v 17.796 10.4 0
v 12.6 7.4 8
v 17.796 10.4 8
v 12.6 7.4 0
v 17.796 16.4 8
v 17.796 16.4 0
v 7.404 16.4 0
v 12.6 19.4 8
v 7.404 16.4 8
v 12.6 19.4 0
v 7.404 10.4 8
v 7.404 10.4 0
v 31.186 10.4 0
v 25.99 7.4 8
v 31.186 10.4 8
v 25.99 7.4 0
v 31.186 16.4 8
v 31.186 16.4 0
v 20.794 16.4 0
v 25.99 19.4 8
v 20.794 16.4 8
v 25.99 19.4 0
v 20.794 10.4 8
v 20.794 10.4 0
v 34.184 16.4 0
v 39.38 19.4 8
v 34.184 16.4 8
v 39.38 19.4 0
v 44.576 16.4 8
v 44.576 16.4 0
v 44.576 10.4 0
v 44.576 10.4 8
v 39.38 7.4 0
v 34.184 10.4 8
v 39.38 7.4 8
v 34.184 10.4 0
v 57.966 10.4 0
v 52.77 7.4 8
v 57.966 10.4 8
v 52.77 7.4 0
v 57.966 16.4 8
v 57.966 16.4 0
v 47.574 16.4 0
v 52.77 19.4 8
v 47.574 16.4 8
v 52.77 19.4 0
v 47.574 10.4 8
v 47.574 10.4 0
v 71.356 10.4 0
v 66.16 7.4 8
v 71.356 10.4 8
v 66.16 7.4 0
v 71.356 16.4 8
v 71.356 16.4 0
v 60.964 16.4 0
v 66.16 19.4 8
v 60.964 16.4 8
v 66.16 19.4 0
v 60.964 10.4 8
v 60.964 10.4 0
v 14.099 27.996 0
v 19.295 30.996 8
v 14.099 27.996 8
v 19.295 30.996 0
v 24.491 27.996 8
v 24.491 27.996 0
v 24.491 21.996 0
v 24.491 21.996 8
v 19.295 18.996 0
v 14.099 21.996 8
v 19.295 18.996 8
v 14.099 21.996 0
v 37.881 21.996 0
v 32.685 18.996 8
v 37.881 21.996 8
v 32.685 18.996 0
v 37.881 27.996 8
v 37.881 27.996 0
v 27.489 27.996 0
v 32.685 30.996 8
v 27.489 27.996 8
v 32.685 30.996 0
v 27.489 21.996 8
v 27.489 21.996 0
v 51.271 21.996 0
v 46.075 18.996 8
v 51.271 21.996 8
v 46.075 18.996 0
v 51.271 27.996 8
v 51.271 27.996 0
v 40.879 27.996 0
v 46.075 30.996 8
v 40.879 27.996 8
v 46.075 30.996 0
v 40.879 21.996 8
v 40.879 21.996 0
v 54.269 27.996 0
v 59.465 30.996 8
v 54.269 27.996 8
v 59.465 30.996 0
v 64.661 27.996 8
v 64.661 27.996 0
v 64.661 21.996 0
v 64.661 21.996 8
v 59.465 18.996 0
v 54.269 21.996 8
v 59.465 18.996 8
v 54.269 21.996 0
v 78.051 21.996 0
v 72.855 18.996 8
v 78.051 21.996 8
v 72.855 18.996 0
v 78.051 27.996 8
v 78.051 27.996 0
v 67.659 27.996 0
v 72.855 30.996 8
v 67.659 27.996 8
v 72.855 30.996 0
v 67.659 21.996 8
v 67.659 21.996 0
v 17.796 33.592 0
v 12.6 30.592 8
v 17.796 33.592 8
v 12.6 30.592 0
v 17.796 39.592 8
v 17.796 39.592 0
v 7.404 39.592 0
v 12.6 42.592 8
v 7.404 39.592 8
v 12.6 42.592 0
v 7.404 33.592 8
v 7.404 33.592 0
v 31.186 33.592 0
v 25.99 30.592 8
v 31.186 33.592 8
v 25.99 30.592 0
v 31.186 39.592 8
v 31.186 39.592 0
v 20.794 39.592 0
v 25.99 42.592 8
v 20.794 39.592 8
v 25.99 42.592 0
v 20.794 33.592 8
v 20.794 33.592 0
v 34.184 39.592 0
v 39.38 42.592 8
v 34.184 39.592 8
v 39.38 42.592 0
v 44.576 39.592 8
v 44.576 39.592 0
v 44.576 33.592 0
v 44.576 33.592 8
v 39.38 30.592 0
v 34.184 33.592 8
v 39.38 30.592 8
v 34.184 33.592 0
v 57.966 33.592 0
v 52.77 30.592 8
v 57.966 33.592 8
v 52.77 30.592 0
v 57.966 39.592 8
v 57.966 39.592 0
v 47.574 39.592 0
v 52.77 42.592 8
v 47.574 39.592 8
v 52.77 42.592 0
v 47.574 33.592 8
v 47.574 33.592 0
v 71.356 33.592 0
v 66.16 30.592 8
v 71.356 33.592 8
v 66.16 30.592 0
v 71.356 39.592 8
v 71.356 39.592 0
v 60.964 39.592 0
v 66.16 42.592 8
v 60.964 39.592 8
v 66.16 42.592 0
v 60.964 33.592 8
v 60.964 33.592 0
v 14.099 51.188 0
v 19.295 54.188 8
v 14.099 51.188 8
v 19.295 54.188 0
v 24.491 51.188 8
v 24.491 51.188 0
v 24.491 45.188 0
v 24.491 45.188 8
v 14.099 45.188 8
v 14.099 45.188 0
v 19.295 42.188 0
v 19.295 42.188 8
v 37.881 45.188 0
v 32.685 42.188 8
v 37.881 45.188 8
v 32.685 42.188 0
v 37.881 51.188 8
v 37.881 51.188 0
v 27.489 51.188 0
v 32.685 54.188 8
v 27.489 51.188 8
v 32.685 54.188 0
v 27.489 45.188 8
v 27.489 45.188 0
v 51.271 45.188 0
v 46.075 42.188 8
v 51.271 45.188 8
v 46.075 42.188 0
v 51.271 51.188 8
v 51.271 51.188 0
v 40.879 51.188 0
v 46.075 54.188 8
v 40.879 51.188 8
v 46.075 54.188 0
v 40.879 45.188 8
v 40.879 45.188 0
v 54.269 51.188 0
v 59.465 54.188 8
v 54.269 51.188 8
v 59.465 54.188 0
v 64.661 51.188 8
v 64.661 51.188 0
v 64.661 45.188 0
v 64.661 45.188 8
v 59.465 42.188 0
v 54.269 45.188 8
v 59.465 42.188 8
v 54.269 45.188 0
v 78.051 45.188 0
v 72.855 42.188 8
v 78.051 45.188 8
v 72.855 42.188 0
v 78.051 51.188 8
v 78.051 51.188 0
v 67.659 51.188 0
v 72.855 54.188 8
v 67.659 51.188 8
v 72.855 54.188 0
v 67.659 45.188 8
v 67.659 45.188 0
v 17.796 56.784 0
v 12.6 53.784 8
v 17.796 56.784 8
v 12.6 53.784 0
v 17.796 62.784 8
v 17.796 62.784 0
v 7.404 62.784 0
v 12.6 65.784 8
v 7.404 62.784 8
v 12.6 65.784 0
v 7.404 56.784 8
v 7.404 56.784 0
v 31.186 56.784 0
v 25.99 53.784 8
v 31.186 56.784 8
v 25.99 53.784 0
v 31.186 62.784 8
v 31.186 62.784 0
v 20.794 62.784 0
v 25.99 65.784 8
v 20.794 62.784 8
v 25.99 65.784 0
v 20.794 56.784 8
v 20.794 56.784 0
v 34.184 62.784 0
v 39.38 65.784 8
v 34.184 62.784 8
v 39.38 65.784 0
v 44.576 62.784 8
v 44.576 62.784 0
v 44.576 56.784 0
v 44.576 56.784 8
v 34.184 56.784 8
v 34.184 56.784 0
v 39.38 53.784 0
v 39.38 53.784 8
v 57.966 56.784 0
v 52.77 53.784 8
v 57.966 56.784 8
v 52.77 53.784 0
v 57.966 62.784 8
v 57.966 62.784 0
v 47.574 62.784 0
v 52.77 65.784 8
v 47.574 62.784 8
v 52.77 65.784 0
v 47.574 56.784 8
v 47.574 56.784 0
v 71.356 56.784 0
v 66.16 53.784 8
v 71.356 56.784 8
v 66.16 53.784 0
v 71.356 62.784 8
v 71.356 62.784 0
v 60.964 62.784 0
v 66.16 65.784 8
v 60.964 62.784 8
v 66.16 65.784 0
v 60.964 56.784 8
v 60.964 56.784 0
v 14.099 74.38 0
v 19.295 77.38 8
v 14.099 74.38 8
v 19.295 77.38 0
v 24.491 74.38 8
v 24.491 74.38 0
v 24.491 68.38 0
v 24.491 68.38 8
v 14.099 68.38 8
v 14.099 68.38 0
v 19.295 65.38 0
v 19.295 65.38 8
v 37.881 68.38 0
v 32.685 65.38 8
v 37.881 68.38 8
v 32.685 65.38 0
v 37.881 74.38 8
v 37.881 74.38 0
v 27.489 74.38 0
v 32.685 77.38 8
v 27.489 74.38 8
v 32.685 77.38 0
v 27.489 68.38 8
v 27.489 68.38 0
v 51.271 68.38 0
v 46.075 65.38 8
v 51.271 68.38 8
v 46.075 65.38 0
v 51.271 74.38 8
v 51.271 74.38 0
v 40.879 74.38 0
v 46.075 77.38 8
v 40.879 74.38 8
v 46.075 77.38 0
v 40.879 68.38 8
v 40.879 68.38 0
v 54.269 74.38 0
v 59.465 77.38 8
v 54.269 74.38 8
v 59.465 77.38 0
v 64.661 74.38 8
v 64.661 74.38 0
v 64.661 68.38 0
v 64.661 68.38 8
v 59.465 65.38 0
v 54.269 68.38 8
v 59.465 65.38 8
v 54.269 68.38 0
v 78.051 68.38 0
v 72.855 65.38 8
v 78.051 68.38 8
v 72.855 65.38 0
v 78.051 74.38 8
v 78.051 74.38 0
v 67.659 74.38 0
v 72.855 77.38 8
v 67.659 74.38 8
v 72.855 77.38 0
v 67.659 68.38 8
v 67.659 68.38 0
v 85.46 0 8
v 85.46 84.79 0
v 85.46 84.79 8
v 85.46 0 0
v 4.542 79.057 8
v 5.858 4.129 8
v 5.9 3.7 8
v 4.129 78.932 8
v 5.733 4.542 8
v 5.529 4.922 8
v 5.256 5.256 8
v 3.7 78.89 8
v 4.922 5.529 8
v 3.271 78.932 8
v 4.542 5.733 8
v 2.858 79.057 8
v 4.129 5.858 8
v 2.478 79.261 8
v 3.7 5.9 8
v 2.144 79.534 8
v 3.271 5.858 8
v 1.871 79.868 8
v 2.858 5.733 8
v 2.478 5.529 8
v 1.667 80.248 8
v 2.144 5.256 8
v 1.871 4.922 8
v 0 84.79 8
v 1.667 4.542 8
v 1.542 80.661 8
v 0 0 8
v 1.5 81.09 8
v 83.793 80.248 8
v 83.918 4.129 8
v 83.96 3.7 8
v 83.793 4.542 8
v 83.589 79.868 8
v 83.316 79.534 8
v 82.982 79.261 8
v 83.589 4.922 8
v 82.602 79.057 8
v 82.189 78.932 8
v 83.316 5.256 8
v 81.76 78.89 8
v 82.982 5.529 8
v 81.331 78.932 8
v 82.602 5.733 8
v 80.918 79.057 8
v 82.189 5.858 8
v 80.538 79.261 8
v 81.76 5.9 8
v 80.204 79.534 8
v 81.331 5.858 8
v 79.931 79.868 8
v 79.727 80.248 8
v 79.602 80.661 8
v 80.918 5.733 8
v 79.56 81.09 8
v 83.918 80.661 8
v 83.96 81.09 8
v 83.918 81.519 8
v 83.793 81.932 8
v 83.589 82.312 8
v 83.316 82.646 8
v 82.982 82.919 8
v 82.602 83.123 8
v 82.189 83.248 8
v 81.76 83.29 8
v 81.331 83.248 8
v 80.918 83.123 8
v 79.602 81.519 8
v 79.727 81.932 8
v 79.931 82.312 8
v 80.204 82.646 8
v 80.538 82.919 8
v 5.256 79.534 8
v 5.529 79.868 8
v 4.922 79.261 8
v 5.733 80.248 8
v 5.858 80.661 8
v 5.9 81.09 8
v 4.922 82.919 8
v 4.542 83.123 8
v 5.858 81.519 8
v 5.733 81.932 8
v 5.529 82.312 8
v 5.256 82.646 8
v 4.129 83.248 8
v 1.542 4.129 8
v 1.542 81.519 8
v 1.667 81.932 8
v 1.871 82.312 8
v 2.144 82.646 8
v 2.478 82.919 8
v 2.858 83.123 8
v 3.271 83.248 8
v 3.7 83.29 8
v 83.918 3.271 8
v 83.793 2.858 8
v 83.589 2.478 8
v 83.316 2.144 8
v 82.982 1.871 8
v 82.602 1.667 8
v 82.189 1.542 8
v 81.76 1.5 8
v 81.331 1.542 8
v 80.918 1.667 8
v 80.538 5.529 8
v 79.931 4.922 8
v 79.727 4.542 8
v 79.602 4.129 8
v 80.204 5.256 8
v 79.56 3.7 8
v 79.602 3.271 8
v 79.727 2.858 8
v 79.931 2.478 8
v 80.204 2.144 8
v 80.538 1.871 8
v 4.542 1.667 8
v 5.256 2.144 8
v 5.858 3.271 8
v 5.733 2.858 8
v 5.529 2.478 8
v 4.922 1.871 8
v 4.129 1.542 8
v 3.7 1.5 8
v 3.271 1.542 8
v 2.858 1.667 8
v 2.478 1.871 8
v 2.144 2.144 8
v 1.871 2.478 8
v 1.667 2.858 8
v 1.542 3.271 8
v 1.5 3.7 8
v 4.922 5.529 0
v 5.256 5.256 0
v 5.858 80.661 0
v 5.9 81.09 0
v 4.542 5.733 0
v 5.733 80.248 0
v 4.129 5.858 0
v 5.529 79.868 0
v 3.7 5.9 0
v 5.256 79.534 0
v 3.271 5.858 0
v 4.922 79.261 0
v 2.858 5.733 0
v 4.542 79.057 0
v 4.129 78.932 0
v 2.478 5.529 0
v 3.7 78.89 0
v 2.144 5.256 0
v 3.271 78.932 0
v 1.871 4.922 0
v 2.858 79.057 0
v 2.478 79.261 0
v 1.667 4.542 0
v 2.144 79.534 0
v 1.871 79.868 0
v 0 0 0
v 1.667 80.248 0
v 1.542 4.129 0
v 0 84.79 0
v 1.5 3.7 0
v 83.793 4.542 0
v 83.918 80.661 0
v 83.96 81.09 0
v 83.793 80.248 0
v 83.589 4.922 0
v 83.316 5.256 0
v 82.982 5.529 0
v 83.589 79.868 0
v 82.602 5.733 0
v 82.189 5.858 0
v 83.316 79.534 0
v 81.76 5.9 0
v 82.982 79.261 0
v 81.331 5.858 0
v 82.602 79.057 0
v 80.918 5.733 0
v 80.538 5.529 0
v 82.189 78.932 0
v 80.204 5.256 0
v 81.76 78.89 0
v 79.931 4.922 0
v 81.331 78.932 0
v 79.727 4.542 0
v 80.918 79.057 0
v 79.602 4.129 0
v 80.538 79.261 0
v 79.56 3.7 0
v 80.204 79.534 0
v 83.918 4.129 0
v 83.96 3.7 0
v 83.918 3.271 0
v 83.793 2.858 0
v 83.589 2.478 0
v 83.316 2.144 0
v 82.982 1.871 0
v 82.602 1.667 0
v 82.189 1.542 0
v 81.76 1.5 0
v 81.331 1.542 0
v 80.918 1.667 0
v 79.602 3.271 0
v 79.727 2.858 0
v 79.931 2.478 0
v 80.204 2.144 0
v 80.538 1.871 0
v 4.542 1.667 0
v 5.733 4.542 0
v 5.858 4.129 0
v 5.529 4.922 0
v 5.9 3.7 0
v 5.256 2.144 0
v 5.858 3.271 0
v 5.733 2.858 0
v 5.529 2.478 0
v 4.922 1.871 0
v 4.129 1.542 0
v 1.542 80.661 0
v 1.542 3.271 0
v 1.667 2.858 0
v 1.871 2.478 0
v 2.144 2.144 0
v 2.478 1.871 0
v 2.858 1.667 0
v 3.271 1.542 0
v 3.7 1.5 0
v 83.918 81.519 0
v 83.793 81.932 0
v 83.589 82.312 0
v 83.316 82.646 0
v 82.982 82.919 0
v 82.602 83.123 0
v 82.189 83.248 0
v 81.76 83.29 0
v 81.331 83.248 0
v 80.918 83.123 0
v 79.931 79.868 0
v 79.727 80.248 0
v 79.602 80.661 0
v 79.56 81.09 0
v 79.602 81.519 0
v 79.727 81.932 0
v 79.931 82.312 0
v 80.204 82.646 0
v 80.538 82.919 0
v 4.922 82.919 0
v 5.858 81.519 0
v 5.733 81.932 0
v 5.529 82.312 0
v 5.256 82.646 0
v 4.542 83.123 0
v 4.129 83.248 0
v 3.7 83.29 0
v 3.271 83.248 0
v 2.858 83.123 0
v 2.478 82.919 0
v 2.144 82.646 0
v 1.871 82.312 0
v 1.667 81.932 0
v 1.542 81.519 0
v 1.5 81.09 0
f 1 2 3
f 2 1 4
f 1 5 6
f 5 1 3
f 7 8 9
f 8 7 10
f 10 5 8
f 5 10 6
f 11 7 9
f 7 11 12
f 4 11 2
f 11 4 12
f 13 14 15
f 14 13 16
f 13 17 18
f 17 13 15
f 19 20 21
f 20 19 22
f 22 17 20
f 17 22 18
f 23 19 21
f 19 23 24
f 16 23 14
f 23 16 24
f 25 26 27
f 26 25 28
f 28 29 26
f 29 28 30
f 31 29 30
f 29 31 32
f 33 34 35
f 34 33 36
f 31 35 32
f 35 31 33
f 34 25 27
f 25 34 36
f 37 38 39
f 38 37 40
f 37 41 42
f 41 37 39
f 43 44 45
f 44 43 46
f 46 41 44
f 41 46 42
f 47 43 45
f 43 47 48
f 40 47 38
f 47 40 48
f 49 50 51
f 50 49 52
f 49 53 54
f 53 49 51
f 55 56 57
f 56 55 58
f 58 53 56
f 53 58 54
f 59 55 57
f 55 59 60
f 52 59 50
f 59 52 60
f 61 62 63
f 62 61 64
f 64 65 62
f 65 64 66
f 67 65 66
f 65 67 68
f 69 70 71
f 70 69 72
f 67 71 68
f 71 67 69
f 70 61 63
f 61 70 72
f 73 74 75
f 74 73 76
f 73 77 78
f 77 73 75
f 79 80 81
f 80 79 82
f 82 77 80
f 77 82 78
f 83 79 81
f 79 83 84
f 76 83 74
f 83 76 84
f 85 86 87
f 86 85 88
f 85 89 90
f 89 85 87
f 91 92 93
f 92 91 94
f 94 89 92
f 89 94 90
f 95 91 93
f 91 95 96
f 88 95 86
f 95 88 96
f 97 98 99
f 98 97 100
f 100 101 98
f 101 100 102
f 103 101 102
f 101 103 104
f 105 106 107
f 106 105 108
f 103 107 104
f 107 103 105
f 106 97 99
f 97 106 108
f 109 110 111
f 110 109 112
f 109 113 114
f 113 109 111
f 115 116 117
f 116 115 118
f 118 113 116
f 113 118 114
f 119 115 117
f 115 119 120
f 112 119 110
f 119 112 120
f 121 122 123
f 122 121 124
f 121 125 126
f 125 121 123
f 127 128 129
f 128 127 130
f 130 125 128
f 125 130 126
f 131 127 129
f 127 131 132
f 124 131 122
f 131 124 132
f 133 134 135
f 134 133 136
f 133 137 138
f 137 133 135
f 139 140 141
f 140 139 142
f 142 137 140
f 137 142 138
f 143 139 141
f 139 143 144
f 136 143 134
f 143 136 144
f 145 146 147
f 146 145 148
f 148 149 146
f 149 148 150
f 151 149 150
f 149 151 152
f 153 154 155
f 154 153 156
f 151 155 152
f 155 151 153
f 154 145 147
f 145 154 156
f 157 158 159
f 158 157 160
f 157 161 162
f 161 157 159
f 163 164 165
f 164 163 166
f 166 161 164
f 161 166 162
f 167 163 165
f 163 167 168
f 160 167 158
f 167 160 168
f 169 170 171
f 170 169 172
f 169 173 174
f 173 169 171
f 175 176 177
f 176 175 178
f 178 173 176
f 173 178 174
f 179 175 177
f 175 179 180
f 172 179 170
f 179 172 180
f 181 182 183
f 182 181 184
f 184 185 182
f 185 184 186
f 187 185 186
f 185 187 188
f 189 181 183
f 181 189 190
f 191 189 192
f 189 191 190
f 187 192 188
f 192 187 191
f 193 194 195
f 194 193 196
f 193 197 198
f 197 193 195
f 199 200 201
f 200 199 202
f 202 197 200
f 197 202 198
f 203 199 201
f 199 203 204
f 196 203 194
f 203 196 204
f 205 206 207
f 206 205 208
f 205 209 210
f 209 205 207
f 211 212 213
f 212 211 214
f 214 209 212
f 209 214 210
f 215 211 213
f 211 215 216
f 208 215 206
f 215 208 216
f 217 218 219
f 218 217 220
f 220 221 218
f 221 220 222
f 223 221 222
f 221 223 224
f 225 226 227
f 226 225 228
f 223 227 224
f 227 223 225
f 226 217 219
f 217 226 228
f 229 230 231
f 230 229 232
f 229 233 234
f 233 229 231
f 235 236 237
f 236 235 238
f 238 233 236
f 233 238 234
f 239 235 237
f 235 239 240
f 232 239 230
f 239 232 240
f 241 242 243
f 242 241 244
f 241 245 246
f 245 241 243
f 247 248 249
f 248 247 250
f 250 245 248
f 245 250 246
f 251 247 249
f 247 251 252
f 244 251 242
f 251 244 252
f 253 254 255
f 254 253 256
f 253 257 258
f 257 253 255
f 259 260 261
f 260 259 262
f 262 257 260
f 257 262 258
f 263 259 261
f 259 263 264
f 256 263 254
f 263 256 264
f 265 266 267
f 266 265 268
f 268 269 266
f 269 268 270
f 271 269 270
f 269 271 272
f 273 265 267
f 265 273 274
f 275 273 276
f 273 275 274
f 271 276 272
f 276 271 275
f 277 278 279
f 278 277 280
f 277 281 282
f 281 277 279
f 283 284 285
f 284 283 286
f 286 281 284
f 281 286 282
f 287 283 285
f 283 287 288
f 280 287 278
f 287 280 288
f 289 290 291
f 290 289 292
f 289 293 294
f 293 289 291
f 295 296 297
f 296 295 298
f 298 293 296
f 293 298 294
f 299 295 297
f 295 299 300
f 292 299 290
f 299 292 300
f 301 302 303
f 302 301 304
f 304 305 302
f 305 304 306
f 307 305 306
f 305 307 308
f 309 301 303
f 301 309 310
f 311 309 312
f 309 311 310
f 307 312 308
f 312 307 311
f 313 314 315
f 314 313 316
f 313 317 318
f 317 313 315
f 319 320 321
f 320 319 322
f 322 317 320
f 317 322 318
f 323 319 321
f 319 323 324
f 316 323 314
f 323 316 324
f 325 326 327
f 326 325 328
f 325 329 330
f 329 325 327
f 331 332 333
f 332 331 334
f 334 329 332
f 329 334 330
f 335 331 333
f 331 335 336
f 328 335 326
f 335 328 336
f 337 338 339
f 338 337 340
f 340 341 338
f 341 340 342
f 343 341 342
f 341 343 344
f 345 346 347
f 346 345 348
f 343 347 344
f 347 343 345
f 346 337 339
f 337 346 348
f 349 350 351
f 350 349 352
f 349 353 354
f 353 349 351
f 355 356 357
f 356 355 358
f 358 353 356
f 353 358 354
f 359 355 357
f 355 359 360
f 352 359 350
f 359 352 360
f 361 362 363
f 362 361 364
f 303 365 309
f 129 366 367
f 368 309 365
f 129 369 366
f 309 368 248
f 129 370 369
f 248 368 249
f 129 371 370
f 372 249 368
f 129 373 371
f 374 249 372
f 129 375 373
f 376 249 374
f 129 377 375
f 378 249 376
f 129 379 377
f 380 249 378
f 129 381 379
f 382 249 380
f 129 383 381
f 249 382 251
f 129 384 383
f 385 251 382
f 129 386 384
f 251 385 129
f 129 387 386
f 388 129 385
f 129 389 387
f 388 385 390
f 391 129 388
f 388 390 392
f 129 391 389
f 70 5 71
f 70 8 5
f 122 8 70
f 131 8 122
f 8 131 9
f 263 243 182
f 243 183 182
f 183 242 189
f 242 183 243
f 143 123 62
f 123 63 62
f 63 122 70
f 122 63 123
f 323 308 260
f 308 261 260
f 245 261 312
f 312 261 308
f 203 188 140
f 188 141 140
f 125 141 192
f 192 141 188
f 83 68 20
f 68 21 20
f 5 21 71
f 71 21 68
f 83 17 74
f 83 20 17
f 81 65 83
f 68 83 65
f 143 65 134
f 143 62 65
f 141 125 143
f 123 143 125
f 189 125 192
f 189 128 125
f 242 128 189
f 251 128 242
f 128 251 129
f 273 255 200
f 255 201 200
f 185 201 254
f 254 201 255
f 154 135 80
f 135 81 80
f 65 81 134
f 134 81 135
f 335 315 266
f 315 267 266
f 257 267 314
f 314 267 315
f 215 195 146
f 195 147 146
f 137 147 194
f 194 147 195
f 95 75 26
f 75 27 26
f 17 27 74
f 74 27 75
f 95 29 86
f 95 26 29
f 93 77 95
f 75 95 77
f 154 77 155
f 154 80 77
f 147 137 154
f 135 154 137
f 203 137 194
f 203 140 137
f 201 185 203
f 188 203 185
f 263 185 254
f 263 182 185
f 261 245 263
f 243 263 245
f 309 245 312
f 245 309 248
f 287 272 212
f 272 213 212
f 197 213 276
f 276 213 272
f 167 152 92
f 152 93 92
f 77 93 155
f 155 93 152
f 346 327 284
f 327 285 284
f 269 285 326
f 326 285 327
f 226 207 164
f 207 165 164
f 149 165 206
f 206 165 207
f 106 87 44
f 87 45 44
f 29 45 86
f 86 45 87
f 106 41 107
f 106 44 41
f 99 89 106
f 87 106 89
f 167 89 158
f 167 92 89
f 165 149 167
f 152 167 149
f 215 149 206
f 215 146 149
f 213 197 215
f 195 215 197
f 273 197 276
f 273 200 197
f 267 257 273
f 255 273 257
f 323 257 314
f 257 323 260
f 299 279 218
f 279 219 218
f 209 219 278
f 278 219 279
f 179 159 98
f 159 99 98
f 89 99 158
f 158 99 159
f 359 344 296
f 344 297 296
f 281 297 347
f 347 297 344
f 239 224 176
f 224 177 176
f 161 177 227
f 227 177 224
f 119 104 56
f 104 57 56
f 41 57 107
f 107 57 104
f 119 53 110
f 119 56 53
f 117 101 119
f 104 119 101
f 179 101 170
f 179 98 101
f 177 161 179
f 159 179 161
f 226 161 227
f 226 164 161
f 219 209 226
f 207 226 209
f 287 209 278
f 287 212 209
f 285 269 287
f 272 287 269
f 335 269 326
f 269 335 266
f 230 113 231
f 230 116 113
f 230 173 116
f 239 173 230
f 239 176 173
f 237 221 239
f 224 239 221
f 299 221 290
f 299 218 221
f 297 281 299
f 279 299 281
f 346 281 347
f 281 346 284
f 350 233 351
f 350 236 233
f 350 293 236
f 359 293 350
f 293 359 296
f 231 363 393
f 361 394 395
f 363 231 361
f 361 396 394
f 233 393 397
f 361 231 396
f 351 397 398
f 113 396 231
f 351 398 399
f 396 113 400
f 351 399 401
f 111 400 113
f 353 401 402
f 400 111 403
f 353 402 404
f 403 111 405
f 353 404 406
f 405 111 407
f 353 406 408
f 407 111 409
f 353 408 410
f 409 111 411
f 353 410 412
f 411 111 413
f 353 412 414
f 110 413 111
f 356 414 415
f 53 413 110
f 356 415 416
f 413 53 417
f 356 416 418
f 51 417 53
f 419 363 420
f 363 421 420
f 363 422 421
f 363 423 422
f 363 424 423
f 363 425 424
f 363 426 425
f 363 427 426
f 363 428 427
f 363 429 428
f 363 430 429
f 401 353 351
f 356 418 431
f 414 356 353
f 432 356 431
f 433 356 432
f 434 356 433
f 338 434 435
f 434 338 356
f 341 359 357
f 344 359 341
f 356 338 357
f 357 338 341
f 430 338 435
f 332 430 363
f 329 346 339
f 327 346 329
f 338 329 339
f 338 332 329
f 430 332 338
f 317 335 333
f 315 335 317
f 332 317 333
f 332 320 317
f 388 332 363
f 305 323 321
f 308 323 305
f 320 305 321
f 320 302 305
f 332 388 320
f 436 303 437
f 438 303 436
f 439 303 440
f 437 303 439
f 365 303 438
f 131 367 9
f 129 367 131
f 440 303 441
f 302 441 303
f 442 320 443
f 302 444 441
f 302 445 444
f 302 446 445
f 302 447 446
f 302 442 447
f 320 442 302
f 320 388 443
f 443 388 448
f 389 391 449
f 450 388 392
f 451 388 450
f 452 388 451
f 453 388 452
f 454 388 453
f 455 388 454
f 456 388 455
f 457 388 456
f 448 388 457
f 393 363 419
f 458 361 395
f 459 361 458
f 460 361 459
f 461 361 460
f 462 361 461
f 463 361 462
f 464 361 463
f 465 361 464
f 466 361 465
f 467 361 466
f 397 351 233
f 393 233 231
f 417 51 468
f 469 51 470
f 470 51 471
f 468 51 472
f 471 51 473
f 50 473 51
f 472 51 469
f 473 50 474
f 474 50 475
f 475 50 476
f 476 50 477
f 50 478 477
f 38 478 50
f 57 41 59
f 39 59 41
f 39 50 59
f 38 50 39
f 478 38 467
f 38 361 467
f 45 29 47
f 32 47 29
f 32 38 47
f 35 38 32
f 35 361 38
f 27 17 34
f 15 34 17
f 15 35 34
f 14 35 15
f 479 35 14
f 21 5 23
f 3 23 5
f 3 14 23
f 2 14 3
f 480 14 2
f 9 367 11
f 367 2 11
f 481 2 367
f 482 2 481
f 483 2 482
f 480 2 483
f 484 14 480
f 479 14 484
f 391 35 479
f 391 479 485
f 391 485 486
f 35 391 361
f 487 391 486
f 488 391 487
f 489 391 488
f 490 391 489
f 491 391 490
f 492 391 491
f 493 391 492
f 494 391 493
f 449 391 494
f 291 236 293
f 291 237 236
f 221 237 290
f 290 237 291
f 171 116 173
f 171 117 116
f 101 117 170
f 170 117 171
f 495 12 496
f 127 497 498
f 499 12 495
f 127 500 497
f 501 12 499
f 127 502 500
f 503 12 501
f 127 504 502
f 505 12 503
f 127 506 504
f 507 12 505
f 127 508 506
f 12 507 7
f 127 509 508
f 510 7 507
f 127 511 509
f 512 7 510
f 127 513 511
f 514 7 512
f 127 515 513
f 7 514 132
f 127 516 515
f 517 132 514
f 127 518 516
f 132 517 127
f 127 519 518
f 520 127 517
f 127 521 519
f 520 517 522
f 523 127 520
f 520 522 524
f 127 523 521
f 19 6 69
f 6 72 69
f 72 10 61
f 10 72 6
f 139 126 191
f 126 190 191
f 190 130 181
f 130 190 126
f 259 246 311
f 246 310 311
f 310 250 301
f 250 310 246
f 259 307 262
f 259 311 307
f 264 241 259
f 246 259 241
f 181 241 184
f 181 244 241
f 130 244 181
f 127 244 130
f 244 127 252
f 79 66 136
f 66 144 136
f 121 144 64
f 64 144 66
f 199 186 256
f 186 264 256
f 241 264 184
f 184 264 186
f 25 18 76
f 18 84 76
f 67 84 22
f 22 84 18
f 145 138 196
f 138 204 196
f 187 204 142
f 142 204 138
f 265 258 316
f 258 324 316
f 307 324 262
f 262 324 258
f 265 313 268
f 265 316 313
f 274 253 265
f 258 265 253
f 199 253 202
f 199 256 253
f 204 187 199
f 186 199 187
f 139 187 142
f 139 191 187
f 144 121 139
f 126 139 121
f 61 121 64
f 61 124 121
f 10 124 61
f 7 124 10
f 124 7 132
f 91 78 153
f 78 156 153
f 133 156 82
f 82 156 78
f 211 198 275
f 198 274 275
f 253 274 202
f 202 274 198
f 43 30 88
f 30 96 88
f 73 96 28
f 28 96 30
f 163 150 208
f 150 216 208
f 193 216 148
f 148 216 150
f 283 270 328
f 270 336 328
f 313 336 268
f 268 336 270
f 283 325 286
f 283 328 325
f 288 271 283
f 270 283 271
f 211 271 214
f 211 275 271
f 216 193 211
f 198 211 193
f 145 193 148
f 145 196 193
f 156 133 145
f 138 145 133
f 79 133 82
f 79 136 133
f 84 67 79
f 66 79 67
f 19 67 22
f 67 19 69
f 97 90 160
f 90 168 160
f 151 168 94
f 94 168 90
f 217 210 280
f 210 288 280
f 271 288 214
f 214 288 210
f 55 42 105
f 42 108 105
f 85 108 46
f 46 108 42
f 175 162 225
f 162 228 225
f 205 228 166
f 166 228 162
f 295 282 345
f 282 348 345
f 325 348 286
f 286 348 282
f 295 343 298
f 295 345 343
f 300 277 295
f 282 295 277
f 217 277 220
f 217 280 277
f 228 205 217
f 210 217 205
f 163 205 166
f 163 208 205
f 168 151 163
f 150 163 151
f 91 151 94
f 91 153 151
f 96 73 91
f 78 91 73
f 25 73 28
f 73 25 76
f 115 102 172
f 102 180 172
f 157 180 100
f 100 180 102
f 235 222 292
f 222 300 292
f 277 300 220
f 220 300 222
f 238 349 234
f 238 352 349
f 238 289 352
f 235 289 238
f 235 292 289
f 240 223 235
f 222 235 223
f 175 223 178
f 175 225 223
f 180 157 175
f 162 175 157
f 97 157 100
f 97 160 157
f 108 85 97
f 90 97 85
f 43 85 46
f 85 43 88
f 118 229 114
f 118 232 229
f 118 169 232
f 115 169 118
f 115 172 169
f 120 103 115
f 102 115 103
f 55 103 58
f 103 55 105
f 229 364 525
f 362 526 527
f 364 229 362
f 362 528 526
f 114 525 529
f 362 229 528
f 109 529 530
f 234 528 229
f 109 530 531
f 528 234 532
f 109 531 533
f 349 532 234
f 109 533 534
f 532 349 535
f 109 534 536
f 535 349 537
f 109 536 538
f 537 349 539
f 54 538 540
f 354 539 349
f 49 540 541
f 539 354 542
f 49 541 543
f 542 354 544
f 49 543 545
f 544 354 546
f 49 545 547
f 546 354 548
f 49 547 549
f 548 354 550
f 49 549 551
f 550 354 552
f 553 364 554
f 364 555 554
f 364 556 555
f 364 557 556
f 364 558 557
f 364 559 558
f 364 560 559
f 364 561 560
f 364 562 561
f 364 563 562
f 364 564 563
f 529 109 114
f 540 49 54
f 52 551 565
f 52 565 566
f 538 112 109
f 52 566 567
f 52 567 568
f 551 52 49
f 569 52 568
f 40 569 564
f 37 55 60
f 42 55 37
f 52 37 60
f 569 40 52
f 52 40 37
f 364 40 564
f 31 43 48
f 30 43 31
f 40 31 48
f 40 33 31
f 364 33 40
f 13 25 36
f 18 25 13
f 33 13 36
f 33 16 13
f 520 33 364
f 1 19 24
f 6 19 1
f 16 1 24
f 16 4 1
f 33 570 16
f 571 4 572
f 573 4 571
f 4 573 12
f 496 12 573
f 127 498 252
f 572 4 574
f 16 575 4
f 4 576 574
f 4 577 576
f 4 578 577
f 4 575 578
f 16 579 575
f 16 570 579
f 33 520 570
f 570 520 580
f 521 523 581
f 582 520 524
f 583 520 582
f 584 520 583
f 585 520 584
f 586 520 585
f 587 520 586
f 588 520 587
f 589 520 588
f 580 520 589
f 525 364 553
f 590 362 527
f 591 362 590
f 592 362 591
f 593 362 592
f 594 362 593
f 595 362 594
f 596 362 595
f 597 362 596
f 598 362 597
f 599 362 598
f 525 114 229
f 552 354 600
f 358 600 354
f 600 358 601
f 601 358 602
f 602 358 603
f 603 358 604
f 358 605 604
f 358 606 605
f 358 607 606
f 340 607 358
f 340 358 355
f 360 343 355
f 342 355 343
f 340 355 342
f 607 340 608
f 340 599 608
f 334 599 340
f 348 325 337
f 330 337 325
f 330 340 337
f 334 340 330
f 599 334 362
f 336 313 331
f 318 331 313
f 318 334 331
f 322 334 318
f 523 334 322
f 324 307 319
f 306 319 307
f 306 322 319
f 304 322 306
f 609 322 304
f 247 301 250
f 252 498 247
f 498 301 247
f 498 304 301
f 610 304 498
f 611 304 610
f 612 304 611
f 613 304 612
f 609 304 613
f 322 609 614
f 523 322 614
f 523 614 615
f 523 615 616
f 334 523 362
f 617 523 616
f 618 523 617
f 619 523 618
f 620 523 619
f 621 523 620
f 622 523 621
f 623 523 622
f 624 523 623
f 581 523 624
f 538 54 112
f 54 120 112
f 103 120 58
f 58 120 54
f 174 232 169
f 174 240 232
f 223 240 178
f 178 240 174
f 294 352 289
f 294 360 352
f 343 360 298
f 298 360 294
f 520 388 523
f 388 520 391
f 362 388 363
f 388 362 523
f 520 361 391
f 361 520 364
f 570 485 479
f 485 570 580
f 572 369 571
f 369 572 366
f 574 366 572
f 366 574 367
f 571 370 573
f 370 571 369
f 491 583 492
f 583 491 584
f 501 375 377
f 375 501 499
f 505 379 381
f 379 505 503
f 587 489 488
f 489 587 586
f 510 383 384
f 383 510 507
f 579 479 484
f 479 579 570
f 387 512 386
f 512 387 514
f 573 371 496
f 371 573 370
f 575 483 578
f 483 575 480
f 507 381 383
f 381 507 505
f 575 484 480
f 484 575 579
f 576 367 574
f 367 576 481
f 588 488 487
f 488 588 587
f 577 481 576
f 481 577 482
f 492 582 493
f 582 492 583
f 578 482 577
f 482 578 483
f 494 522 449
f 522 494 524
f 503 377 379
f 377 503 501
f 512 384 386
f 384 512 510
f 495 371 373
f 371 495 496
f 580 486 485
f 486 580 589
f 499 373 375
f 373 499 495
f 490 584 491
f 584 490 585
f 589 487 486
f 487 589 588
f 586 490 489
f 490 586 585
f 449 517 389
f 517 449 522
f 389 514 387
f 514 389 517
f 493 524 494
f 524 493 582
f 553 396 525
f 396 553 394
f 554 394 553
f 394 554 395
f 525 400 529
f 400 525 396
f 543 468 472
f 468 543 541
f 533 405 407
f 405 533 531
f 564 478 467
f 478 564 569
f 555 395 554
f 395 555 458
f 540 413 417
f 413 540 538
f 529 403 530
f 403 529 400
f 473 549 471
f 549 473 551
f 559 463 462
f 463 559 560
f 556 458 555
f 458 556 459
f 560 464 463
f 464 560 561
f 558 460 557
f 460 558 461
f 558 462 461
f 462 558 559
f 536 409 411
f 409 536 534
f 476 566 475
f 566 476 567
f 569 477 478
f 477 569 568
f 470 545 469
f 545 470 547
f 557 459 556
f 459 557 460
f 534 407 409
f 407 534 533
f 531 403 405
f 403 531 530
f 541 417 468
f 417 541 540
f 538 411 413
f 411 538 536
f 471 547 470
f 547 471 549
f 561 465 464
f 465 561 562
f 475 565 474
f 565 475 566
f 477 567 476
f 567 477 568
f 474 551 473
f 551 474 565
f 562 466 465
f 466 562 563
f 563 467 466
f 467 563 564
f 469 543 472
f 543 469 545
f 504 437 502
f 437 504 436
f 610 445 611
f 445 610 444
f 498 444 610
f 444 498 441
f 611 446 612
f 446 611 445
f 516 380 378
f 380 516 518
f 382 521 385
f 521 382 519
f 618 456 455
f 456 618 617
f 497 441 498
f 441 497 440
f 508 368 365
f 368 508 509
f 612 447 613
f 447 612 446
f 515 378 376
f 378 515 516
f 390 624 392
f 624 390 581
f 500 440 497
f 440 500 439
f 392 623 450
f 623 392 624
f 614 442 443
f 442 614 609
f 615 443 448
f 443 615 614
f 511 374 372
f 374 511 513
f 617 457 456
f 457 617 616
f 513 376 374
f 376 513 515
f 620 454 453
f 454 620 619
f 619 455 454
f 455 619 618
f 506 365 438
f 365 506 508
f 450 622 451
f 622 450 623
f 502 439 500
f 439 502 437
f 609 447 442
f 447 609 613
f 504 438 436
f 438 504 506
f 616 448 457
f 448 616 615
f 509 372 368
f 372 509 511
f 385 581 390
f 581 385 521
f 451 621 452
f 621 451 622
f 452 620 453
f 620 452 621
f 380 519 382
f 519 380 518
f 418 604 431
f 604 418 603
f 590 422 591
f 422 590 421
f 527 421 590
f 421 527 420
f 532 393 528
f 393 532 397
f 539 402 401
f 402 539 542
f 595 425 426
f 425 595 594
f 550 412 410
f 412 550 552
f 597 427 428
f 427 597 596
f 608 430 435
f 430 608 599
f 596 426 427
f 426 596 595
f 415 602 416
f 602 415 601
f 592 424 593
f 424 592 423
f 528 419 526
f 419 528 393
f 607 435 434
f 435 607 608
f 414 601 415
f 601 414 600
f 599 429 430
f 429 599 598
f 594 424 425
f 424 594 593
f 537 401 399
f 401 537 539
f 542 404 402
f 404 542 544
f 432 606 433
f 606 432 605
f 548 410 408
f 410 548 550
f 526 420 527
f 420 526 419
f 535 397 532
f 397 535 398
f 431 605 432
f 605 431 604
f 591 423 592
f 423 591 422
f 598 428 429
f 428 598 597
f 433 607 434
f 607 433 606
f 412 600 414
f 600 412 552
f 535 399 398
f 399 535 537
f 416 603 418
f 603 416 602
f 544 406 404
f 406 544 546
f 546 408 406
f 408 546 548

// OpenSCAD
$fn = 32;
// ----------------------------------------------------------------------
// Honeycomb panel: 85.46 x 84.79 mm, 30 cells of 12 mm
// ----------------------------------------------------------------------

// --- parameters (mm) ---
panel_w = 85.46;          // panel width
panel_d = 84.79;          // panel depth
thick = 8;                // panel thickness
cell_r = 6;               // hex cell circumradius
pitch = 13.39;            // hex cell pitch (centre to centre)
web = 3;                  // web between the cells
columns = 5;              // columns of cells
rows = 6;                 // rows of cells
cell_count = 30;          // total cells
shift_x = 12.6;           // first cell offset in x
shift_y = 13.4;           // first cell offset in y
mount_d = 4.4;            // corner mounting holes
hole_off = 3.7;           // mounting hole offset from the corners

difference() {
  union() {
    cube([panel_w, panel_d, thick]);
  }
  /* hexagonal cells, point-up, cut right through the plate */
  for (row = [0 : rows - 1]) {
    for (col = [0 : columns - 1]) {
      translate([shift_x + col * pitch + (row % 2) * pitch / 2, shift_y + row * pitch * 0.866025, -2.5]) rotate([0, 0, 30]) cylinder(h = thick + 5, d = 2 * cell_r, $fn = 6);
    }
  }
  /* corner mounting holes, clear of the outer cell web */
  translate([3.7, 3.7, -2.5]) cylinder(h = thick + 5, d = mount_d);
  translate([81.76, 3.7, -2.5]) cylinder(h = thick + 5, d = mount_d);
  translate([3.7, 81.09, -2.5]) cylinder(h = thick + 5, d = mount_d);
  translate([81.76, 81.09, -2.5]) cylinder(h = thick + 5, d = mount_d);
}
